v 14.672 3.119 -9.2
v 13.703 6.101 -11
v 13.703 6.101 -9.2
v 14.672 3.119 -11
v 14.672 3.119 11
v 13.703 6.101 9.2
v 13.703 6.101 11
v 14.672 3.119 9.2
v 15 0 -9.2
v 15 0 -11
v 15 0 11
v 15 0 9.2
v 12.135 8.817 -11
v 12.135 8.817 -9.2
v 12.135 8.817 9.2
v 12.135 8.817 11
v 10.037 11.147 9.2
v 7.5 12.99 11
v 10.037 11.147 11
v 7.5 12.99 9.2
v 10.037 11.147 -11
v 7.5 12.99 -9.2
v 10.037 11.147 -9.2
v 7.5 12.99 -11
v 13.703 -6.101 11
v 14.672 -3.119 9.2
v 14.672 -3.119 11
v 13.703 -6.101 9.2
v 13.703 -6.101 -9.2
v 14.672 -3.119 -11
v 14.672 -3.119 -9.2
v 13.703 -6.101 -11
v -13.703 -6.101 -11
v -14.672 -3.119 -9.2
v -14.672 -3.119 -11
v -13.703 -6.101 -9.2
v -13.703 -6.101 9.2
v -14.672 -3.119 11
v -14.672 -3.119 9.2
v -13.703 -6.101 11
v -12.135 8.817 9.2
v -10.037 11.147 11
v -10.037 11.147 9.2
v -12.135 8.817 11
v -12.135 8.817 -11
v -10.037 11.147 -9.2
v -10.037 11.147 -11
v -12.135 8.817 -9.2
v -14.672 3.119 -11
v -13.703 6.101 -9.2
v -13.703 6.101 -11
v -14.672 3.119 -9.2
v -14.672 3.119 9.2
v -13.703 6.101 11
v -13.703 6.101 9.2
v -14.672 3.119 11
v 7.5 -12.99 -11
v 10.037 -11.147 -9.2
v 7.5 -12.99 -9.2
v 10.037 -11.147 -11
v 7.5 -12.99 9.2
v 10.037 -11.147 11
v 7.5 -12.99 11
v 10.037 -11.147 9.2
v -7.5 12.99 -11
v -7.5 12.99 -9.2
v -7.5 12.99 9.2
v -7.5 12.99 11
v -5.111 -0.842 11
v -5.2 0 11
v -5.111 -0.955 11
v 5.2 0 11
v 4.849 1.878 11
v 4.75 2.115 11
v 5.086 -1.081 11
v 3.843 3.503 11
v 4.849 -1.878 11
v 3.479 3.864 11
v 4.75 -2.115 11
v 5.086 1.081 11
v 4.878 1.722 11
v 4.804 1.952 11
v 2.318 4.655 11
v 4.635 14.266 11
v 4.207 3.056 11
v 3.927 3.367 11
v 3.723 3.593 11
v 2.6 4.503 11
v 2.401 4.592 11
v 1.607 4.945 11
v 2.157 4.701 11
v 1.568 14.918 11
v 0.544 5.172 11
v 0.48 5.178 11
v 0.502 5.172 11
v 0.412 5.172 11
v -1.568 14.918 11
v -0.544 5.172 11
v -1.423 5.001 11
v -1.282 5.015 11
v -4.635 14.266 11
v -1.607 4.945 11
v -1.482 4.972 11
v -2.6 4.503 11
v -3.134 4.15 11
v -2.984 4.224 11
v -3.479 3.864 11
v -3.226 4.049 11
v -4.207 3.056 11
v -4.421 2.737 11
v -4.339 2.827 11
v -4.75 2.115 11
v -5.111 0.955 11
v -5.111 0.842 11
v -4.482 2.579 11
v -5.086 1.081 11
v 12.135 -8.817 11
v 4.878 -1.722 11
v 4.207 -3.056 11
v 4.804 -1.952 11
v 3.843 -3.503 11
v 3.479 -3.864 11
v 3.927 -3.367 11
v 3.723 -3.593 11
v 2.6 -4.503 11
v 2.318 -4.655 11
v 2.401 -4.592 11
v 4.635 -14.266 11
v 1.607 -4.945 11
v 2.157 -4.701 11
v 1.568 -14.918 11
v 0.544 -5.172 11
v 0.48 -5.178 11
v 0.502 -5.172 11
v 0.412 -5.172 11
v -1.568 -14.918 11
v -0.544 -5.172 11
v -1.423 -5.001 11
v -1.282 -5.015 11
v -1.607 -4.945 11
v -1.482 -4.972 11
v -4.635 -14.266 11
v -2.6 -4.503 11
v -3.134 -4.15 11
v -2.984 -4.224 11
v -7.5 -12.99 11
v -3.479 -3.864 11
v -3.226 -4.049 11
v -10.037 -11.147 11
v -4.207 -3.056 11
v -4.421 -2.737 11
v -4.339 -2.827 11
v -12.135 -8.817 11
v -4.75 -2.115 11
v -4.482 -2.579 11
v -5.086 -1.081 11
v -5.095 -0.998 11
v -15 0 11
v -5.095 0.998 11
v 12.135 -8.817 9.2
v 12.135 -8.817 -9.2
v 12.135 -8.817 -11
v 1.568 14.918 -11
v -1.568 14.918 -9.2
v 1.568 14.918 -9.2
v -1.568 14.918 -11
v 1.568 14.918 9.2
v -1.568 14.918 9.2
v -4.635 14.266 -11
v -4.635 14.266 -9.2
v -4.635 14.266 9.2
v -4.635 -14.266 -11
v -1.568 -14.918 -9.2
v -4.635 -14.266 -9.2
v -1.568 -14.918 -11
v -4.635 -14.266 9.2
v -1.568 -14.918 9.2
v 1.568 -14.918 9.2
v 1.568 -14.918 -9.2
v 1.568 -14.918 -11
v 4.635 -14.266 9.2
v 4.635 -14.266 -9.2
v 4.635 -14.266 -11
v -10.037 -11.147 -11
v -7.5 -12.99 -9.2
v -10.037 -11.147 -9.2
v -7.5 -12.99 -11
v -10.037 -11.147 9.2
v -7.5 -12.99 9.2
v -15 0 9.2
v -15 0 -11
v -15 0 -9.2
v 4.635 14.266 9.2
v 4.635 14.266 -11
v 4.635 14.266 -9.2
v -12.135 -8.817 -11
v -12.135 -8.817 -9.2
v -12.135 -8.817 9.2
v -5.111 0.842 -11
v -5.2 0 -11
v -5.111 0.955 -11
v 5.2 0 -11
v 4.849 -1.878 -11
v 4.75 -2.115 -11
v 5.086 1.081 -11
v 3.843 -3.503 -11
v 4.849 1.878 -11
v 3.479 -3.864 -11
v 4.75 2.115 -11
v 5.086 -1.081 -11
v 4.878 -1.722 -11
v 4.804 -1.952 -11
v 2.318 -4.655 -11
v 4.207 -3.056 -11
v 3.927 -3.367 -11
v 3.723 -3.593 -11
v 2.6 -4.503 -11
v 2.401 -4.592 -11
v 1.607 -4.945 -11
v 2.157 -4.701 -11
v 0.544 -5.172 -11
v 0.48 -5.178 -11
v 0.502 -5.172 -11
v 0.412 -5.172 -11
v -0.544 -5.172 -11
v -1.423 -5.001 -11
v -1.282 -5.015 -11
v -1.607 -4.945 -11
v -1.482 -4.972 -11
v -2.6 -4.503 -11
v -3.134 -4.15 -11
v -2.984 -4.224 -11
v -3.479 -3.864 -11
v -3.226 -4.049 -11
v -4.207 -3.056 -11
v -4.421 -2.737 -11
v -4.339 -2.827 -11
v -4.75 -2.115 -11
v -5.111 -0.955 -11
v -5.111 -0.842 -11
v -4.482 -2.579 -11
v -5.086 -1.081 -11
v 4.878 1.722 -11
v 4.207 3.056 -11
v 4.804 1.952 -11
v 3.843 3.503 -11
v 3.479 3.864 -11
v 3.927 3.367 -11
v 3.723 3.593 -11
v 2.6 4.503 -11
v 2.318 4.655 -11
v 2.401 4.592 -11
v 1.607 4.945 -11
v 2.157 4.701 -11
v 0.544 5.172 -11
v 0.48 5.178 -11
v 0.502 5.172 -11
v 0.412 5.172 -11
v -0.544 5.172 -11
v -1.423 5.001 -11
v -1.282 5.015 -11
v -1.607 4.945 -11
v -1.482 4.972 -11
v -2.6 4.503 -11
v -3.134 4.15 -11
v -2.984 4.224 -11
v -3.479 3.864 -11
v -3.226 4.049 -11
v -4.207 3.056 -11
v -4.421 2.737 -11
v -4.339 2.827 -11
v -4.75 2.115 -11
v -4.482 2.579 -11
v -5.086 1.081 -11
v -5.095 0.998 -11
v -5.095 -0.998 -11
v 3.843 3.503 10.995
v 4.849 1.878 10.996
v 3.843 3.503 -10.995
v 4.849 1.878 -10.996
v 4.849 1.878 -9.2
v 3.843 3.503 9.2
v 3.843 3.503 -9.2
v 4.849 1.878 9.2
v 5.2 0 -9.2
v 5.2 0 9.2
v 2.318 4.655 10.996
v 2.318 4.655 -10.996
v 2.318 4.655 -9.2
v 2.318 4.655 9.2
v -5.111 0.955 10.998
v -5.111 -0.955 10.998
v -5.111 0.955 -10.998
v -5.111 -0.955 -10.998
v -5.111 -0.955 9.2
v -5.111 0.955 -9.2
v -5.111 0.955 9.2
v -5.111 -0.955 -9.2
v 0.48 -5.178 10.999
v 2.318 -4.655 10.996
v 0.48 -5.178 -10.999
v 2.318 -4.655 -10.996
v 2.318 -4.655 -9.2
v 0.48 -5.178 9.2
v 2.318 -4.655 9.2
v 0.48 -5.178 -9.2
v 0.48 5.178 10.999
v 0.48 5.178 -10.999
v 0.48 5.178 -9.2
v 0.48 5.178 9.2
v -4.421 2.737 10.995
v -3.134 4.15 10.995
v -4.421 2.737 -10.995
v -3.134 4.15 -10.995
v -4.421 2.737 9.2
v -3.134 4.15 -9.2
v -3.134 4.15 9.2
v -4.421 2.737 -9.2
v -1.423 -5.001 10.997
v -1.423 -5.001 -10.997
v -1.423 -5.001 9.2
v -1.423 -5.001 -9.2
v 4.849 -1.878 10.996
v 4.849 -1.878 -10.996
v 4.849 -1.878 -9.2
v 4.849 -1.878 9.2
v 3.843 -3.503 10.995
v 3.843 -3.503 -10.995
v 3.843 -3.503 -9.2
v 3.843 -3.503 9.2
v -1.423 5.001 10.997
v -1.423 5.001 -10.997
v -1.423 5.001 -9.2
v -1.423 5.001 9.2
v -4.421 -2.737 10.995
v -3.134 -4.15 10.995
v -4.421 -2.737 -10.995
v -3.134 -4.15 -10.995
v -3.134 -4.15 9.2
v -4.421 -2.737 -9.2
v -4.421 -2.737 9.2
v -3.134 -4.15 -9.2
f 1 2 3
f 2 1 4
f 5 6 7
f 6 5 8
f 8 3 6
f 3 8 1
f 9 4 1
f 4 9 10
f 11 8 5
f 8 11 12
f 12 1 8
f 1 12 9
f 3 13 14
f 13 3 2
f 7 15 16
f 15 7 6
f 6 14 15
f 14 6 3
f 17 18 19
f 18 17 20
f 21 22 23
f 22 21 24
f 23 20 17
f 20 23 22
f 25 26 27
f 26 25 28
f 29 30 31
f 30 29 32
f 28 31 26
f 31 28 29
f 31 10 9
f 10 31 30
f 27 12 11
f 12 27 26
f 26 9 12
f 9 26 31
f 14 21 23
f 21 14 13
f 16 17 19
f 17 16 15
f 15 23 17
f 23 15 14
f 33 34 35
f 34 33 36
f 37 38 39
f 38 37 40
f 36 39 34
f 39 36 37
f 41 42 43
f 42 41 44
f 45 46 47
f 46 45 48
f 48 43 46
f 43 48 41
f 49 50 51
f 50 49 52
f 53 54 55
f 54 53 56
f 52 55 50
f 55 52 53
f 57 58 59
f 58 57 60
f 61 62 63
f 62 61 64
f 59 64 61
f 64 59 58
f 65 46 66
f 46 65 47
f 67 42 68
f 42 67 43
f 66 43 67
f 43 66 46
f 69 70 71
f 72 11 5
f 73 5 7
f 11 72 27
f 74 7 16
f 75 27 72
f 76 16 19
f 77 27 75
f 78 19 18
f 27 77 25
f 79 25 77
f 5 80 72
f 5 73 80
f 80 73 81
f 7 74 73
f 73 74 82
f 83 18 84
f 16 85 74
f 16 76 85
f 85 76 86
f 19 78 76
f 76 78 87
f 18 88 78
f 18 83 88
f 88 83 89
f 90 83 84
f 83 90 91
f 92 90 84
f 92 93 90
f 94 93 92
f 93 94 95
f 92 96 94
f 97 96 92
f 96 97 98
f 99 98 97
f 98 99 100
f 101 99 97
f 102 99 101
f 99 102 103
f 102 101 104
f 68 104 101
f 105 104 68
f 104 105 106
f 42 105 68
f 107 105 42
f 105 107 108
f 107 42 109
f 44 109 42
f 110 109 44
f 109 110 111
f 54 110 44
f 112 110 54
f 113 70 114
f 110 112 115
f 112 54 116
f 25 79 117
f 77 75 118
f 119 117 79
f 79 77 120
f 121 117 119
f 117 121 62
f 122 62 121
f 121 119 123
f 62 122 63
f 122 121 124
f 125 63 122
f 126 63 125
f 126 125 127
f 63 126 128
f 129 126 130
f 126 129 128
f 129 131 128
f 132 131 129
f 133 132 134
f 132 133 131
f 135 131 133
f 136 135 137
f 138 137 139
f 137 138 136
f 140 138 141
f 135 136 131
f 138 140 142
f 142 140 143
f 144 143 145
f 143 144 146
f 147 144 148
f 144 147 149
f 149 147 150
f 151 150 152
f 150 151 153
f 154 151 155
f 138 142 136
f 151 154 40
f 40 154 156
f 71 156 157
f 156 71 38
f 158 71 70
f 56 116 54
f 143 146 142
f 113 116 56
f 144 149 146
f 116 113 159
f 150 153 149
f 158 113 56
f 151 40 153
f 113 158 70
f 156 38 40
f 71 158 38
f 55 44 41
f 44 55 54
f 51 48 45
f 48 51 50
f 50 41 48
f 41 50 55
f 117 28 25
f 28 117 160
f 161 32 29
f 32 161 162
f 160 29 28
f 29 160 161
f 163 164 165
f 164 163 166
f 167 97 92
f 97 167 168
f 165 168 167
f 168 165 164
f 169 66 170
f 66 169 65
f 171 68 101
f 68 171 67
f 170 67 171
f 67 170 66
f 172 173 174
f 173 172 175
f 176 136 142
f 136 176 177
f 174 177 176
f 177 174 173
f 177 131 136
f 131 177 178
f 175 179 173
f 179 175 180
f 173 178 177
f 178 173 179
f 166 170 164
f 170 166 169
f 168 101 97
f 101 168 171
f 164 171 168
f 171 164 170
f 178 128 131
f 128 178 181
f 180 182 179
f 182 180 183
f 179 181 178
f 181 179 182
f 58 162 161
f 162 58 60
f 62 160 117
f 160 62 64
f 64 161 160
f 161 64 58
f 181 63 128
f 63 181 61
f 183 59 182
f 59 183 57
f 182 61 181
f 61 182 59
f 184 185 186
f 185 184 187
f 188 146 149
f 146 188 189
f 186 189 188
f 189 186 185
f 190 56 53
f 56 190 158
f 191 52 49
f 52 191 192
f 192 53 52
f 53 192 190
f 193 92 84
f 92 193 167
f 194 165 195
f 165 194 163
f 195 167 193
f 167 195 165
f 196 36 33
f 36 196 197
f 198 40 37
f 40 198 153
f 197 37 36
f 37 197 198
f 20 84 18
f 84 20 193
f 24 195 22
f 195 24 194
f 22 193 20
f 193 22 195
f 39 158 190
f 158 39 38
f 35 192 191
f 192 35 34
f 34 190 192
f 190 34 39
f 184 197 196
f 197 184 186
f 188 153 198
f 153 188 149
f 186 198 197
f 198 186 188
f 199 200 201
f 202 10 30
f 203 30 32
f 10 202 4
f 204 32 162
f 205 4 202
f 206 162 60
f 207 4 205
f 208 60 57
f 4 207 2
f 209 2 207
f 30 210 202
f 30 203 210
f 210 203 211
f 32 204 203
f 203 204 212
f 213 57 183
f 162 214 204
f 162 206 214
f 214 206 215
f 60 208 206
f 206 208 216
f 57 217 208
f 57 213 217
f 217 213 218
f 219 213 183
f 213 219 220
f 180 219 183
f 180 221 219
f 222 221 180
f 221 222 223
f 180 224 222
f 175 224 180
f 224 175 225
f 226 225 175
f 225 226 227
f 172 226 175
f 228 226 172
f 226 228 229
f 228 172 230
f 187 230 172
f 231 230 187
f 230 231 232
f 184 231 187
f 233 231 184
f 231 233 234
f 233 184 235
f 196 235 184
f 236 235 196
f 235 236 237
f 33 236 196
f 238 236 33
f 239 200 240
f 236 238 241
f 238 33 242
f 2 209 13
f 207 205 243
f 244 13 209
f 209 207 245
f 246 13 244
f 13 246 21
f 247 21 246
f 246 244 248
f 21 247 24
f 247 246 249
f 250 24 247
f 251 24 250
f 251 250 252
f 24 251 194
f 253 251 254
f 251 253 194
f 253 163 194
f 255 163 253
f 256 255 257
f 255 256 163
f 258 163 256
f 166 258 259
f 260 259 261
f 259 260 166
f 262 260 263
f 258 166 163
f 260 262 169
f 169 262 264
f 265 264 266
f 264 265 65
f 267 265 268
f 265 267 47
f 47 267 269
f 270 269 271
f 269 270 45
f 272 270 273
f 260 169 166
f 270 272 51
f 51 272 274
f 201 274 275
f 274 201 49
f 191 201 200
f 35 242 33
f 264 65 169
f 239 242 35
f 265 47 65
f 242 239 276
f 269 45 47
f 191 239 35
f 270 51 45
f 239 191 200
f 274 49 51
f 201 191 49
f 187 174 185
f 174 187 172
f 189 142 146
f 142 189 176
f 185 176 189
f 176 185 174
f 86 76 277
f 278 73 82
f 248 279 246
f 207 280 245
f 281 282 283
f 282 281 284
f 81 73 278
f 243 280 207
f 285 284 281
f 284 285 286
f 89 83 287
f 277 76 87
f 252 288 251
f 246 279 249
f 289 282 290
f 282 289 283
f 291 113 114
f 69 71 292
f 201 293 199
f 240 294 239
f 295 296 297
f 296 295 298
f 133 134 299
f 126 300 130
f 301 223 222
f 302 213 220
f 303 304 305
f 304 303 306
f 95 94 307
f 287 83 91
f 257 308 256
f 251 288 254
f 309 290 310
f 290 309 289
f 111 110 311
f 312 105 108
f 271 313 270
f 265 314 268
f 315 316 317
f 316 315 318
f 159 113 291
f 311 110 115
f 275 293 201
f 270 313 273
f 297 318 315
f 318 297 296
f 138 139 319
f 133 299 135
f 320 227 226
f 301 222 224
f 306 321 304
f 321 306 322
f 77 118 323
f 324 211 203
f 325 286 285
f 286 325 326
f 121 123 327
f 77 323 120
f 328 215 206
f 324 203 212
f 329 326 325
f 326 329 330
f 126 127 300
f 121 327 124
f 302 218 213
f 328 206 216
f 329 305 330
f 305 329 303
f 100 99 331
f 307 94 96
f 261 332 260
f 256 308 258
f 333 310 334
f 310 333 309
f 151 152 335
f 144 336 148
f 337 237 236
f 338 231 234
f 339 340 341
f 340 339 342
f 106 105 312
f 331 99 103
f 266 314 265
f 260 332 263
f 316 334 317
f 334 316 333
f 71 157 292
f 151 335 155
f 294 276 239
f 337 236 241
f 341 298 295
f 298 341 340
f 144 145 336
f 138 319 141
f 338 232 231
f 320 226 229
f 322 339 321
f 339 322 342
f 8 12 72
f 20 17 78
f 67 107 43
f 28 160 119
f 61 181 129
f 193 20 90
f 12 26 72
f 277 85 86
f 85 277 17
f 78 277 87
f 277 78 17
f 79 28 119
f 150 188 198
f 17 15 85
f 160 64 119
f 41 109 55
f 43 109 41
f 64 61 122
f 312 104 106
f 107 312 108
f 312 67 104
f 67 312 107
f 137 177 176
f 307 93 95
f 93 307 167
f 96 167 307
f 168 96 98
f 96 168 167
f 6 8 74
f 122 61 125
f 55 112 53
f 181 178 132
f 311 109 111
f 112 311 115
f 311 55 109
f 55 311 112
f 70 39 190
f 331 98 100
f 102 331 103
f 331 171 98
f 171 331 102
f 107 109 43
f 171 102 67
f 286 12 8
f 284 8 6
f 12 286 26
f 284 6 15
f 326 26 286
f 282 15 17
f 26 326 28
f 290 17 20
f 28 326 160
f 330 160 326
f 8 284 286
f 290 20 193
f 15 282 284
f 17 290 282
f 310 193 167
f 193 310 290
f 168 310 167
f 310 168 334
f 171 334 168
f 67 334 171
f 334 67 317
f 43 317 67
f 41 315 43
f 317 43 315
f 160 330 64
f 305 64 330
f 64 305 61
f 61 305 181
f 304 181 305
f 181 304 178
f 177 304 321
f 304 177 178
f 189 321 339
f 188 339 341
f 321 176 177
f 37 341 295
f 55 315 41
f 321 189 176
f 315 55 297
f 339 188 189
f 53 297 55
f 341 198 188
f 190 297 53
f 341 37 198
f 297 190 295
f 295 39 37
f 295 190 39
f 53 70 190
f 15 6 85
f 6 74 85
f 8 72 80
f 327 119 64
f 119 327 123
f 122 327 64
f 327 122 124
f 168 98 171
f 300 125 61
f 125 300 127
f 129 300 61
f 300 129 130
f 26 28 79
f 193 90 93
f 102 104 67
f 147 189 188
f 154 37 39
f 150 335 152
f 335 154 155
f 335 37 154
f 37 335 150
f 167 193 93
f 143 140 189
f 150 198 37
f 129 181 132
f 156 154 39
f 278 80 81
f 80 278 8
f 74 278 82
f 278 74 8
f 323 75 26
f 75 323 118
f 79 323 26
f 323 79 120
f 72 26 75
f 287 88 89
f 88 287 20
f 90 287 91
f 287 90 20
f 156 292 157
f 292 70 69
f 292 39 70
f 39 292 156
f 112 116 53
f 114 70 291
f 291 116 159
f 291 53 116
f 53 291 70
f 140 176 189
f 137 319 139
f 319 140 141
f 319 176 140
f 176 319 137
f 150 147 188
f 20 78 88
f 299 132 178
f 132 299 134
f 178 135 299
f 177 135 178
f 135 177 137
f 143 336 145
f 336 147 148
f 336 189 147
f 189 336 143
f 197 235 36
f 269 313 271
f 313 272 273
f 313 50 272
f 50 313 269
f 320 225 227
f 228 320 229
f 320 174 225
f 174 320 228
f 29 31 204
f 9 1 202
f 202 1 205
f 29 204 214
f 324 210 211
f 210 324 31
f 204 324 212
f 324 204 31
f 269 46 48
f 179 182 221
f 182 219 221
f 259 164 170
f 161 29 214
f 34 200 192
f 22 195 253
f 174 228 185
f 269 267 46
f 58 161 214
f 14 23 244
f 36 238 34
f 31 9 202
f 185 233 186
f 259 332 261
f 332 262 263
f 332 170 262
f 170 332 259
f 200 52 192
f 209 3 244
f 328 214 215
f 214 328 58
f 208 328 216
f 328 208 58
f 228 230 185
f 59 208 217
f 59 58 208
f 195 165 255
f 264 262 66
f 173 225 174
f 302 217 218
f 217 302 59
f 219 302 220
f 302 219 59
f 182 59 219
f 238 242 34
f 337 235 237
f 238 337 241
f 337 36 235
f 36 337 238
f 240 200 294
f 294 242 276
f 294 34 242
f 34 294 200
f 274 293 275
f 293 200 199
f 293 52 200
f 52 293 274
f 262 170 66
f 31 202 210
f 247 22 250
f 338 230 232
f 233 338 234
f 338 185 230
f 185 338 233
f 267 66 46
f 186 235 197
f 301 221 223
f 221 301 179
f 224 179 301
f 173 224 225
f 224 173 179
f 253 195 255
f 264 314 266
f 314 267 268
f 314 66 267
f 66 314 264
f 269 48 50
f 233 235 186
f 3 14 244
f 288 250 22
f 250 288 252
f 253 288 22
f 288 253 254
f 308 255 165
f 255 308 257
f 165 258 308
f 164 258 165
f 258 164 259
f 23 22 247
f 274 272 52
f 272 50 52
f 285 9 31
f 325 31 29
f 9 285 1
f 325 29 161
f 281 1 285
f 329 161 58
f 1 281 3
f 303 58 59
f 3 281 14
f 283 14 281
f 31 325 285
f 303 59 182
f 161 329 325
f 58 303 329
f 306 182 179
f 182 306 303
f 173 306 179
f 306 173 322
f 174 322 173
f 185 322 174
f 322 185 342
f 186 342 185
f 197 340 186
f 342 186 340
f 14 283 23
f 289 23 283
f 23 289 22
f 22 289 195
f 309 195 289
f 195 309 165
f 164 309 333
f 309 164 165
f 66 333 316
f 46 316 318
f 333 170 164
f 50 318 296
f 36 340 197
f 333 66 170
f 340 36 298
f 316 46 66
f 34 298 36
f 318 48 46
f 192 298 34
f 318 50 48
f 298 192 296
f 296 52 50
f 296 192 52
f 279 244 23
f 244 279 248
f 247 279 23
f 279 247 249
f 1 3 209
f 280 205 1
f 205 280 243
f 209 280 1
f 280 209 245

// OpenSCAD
// Parameters
outer_diameter_mm = 30; //[15:60:0.5]
length_mm = 22; //[11:44:0.5]
screw_nominal_diameter_mm = 12; //[6:24:0.5]
internal_thread_pitch_mm = 1.75; //[0.75:3.5:0.05]
bore_minor_diameter_mm = 10.2; //[5.1:20.4:0.1]
thread_depth_mm = 22; //[11:44:0.5]
top_chamfer_mm = 1; //[0.5:2:0.1]
bottom_chamfer_mm = 1; //[0.5:2:0.1]
outer_edge_chamfer_mm = 0.5; //[0.25:1.5:0.05]
overlap_mm = 0.8; //[0.5:2:0.1]
bore_clearance_mm = 0.2; //[0:0.6:0.05]

// Threaded Insert - complete geometry
module threaded_insert() {
  color("Silver") {
    // Insert Body
    difference() {
      union() {
        // Main Body
        cylinder(r=outer_diameter_mm/2, h=length_mm, center=true);
        // Installation End Face
        translate([0, 0, -length_mm/2 + overlap_mm/2])
          cylinder(r=outer_diameter_mm/2, h=overlap_mm, center=true);
        // Outer Edge Chamfers
        translate([0, 0, length_mm/2 - (outer_edge_chamfer_mm + overlap_mm)/2])
          cylinder(r1=outer_diameter_mm/2, r2=outer_diameter_mm/2 - outer_edge_chamfer_mm, h=outer_edge_chamfer_mm + overlap_mm, center=true);
        translate([0, 0, -length_mm/2 + (outer_edge_chamfer_mm + overlap_mm)/2])
          cylinder(r1=outer_diameter_mm/2 - outer_edge_chamfer_mm, r2=outer_diameter_mm/2, h=outer_edge_chamfer_mm + overlap_mm, center=true);
      }
      // Internal Threaded Bore
      cylinder(r=(bore_minor_diameter_mm + bore_clearance_mm)/2, h=thread_depth_mm + 2*overlap_mm, center=true);
      // Lead-in Chamfers
      translate([0, 0, length_mm/2 - (top_chamfer_mm + overlap_mm)/2])
        cylinder(r1=outer_diameter_mm/2, r2=(bore_minor_diameter_mm + bore_clearance_mm)/2, h=top_chamfer_mm + overlap_mm, center=true);
      translate([0, 0, -length_mm/2 + (bottom_chamfer_mm + overlap_mm)/2])
        cylinder(r1=(bore_minor_diameter_mm + bore_clearance_mm)/2, r2=outer_diameter_mm/2, h=bottom_chamfer_mm + overlap_mm, center=true);
    }
  }
}

// Assembly
module assembly() {
  threaded_insert();
}

assembly();
